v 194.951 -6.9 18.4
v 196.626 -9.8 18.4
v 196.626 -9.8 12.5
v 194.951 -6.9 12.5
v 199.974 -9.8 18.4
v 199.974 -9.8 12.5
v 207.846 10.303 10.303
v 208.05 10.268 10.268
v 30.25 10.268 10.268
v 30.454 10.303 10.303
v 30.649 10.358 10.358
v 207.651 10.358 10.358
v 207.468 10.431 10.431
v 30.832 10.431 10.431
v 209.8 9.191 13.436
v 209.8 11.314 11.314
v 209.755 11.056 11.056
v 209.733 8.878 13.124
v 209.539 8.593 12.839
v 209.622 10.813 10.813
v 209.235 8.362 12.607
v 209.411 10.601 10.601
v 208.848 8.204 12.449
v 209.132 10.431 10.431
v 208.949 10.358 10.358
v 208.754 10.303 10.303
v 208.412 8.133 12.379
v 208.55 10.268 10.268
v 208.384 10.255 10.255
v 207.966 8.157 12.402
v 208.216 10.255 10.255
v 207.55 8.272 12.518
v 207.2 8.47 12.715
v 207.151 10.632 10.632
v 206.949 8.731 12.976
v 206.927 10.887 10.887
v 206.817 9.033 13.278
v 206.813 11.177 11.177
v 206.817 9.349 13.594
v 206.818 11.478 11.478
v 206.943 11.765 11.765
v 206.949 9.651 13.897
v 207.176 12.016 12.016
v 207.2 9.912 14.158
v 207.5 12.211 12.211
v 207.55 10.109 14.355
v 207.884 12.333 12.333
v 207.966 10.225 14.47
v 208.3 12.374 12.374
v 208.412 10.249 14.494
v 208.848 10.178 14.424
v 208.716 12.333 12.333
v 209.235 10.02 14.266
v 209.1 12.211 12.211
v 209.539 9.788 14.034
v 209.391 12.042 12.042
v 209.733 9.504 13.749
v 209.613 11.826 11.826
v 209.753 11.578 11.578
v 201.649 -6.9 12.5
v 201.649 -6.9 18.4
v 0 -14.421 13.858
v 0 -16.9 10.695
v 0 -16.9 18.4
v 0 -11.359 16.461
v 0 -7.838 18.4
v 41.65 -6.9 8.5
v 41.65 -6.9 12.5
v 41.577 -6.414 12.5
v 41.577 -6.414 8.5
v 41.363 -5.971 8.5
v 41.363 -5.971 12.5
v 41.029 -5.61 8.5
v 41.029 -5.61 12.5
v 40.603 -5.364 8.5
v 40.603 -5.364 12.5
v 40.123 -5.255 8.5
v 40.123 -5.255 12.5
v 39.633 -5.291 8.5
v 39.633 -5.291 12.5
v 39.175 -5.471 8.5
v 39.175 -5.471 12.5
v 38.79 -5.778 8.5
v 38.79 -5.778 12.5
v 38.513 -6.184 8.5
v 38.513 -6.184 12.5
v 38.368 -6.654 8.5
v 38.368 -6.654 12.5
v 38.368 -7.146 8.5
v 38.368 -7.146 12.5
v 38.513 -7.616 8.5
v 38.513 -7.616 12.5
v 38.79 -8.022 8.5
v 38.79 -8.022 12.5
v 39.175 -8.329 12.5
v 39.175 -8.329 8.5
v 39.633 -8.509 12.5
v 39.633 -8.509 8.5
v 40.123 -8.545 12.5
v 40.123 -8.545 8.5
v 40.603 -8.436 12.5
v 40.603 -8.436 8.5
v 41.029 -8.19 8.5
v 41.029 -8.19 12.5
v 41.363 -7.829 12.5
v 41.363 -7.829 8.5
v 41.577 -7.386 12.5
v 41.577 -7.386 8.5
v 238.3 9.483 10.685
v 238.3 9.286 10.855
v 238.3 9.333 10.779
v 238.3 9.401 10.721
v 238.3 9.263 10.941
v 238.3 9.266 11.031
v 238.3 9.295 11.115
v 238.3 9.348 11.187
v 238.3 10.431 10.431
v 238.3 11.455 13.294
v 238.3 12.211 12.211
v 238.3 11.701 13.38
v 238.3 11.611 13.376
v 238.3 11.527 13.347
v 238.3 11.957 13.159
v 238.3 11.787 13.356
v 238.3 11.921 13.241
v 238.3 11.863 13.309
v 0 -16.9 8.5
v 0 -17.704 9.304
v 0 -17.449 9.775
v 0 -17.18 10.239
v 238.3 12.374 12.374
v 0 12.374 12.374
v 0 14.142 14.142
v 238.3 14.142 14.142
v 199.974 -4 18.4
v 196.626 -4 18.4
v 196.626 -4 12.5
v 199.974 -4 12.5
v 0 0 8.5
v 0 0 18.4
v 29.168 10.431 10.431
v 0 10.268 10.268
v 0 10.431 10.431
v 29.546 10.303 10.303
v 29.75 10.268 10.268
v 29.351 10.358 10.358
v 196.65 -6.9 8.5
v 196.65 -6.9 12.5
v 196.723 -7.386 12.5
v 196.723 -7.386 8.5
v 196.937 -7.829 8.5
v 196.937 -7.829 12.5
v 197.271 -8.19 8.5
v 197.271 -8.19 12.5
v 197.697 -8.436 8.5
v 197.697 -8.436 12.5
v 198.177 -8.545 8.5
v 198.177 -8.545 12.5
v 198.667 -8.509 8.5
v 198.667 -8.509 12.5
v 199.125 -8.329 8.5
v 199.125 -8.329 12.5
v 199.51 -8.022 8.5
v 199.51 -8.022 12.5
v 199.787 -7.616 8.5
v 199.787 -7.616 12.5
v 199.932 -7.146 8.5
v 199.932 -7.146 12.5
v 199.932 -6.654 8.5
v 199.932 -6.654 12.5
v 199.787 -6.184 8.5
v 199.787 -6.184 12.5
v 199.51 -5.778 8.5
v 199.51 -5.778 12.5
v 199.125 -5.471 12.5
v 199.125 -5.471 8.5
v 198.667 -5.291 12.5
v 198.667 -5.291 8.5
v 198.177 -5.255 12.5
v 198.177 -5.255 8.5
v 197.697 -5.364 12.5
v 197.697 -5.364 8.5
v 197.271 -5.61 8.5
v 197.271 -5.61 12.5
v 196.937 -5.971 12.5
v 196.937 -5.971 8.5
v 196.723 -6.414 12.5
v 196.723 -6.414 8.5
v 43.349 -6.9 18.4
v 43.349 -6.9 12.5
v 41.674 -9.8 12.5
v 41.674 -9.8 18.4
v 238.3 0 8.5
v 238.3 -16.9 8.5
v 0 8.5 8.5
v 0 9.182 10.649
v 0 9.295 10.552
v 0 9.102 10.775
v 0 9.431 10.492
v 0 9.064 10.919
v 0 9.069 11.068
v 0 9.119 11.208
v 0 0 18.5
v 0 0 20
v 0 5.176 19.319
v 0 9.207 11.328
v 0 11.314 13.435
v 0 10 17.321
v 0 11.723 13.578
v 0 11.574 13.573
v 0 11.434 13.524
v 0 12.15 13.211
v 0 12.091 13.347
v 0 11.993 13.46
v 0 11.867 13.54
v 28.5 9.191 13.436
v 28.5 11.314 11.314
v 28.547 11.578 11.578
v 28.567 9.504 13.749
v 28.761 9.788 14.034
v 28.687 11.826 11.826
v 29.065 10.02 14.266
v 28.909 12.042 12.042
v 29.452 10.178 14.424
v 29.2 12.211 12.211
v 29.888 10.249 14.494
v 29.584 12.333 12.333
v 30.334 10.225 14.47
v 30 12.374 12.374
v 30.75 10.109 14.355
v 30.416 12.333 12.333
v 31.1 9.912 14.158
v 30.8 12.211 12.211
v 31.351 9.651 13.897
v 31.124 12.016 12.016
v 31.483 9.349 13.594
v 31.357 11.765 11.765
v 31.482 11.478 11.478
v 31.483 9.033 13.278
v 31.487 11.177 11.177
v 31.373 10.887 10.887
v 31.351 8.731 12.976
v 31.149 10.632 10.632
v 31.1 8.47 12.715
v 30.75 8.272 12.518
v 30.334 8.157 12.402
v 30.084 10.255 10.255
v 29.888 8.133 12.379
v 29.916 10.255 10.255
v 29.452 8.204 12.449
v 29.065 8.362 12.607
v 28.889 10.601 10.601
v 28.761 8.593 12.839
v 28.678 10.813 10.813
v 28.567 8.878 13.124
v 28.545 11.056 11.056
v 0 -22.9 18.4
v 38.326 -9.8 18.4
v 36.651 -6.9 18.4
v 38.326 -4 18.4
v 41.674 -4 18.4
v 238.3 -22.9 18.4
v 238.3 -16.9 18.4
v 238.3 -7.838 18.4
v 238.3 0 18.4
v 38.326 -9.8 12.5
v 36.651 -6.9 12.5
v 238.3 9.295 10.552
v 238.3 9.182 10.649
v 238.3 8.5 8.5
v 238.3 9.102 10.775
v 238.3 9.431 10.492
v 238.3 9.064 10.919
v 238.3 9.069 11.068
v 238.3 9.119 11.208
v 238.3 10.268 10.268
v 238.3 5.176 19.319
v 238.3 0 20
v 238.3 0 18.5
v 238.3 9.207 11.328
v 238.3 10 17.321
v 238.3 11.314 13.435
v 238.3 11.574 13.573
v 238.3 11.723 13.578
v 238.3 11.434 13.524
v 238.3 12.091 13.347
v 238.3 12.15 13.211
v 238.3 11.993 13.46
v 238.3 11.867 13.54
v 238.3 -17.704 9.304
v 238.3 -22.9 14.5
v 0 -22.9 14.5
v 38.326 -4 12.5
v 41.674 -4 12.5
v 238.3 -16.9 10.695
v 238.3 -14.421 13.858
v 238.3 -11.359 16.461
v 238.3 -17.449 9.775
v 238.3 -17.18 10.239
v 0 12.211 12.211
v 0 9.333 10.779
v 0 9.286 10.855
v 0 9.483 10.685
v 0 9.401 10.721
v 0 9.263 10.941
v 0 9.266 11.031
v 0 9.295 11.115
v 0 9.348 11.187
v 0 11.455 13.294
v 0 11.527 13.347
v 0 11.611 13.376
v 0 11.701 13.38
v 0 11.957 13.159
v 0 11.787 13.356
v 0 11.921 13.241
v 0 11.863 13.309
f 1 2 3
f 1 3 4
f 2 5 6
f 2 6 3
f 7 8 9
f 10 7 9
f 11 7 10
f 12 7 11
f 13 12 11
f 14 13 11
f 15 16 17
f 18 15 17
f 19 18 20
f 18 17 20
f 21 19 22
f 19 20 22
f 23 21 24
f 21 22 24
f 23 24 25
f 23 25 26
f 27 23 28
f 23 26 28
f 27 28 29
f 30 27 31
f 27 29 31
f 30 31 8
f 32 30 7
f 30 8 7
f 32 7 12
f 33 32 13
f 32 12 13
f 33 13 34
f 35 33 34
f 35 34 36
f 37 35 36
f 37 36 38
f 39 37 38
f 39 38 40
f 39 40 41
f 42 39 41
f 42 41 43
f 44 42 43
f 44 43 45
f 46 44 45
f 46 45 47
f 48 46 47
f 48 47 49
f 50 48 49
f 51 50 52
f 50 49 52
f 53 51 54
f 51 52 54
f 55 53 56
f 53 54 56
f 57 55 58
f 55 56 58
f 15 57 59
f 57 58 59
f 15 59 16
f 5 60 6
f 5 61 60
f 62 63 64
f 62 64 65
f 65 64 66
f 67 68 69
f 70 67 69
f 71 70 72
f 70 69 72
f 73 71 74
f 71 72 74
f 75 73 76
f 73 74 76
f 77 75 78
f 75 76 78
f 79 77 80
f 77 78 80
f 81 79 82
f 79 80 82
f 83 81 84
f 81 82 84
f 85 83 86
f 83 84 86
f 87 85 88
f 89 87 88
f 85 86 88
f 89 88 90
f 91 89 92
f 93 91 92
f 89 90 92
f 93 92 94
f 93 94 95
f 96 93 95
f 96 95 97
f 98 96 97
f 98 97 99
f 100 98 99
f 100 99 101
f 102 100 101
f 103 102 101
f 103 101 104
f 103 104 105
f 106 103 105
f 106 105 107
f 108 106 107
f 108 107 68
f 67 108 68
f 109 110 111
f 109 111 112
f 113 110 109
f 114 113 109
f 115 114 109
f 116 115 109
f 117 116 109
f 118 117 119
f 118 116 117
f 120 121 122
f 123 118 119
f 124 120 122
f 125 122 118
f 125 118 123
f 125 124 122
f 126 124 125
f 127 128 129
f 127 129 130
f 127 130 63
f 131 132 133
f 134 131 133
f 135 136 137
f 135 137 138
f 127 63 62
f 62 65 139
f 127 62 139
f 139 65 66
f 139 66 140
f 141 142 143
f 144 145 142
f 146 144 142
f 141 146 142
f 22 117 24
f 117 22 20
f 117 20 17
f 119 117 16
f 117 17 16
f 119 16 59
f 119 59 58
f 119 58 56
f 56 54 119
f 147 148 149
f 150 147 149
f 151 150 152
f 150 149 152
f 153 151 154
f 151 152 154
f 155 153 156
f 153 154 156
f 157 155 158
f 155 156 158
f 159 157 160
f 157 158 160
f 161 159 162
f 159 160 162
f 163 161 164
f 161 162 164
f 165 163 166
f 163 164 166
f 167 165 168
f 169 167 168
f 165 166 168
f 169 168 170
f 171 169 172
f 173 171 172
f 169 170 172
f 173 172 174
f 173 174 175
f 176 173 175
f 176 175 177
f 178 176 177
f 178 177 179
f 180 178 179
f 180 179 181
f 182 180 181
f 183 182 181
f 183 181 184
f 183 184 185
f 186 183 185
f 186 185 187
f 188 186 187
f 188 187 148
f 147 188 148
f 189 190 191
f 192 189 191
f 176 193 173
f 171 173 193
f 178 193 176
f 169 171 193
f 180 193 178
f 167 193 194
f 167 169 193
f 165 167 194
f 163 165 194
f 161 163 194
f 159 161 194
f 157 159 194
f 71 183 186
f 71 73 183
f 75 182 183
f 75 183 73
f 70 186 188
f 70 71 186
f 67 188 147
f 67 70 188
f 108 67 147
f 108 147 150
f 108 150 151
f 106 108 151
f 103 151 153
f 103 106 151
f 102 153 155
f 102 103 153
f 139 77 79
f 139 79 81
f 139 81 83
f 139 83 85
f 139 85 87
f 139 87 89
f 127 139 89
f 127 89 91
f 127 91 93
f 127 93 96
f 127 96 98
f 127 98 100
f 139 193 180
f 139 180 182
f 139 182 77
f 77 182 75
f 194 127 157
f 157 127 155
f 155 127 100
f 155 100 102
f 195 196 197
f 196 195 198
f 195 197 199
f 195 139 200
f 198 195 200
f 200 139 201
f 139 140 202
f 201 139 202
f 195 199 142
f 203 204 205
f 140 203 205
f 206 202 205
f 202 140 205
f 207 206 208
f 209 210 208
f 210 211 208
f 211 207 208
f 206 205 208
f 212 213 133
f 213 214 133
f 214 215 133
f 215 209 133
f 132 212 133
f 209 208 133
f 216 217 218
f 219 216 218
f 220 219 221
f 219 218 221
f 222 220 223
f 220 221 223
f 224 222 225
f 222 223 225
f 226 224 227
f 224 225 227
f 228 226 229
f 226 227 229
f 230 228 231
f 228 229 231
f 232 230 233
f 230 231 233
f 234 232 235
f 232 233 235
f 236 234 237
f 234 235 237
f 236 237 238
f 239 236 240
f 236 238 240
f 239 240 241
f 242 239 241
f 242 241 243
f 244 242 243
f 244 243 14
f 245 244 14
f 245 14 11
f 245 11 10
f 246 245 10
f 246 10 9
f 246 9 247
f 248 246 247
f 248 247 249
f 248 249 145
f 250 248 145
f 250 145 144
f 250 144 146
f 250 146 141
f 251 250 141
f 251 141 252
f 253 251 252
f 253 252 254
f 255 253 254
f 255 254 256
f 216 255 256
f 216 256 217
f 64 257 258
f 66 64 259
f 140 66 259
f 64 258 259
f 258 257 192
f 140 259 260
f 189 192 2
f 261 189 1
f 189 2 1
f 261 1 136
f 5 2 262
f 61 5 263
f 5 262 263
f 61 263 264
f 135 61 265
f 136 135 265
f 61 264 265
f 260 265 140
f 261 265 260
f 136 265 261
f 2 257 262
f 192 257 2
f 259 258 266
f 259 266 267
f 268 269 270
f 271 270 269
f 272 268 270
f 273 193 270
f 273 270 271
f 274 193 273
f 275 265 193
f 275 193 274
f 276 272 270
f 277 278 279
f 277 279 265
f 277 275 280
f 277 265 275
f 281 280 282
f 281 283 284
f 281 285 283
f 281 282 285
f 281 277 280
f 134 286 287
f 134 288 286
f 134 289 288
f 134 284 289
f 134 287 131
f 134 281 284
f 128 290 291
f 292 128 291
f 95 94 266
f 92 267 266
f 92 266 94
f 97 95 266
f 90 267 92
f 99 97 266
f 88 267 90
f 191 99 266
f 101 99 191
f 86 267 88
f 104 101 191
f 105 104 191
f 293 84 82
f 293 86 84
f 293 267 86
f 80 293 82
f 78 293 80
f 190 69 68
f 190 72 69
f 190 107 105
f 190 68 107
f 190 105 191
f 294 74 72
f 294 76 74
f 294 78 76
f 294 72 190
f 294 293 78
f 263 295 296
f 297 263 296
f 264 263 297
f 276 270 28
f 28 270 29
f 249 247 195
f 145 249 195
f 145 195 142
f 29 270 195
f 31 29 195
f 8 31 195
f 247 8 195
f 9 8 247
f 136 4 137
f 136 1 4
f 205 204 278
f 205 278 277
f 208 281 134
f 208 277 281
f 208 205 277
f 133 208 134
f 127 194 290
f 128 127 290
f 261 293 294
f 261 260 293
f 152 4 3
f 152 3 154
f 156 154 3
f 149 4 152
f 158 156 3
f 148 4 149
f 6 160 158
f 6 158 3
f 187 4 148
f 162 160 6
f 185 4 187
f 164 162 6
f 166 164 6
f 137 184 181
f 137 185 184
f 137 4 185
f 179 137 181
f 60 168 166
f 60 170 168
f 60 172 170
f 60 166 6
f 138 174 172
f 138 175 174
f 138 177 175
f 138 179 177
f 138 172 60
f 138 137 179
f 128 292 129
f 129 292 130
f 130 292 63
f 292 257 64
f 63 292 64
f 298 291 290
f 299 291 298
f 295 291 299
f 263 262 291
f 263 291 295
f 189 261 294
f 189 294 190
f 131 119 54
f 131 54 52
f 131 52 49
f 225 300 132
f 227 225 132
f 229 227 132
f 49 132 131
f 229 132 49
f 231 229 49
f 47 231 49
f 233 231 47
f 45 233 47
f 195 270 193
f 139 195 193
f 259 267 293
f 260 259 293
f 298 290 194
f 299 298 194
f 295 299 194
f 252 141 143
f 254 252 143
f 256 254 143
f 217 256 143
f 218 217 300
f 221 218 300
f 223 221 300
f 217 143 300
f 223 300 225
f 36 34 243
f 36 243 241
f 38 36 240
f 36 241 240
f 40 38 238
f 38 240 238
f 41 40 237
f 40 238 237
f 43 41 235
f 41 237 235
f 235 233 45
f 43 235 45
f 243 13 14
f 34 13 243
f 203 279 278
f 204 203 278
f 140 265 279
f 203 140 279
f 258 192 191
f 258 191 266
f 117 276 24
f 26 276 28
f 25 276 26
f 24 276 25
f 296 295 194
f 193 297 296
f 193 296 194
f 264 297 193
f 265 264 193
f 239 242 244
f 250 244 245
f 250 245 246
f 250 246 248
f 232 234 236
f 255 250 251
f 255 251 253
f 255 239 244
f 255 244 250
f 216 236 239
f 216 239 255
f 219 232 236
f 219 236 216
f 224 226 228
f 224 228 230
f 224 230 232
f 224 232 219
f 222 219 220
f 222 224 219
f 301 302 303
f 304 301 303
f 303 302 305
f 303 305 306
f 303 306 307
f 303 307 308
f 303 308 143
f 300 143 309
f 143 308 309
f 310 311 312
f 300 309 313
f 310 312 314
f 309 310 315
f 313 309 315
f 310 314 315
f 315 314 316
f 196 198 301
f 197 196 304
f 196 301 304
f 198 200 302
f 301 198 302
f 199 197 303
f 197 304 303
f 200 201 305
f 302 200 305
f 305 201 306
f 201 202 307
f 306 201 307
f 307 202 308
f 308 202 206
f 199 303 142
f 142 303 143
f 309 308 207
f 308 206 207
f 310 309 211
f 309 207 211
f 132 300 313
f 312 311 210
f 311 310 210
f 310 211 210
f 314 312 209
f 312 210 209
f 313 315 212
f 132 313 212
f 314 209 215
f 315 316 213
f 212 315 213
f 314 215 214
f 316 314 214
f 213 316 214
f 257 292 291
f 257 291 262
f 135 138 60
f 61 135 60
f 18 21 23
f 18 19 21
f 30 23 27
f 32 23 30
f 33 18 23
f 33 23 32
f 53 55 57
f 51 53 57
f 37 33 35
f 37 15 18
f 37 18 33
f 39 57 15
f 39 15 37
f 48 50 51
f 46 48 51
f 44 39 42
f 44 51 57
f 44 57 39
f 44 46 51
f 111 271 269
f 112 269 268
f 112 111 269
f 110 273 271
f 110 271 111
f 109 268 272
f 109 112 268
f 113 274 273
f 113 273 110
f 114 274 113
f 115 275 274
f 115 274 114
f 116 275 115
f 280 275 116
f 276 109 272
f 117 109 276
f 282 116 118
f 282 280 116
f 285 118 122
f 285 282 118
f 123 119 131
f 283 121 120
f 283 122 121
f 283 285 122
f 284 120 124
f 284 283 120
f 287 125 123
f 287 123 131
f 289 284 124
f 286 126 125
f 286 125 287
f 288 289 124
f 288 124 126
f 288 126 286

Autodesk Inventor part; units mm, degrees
ref_plane "YZ Plane" through (0, 0, 0) normal (1, 0, 0) x (0, 1, 0)
ref_plane "XZ Plane" through (0, 0, 0) normal (0, 1, 0) x (-1, 0, 0)
ref_plane "XY Plane" through (0, 0, 0) normal (0, 0, 1) x (1, 0, 0)
sketch "Sketch1" plane through (0, 0, 0) normal (1, 0, 0) x (0, 1, 0)
  circle A0 centre (0, 0) radius 20
  line L0 (8.5, 8.5) -> (-16.9, 8.5)
  line L1 (8.5, 8.5) -> (8.5, -16.9)
  line L2 (0, 0) -> (0, 20)
  line L3 (0, 20) -> (-60.9241, 20)
  line L4 (-60.9241, 20) -> (-60.9241, 18.5)
  line L5 (-60.9241, 18.5) -> (0, 18.5)
  line L6 (0, 18.5) -> (0, 20)
  line L7 (0, 0) -> (14.1421, 14.1421)
  line L8 (0, 0) -> (20, 0)
  line L9 (-16.9, 8.5) -> (-16.9, 18.5)
  line L10 (-16.9, 8.5) -> (-22.9, 14.5)
  line L11 (-22.9, 14.5) -> (-22.9, 18.5)
  line L12 (12.3744, 12.3744) -> (12.1502, 13.2109)
  line L13 (11.3137, 13.435) -> (9.2071, 11.3284)
  line L14 (9.4313, 10.4919) -> (10.2678, 10.2678)
  line L15 (8.5, 8.5) -> (8.5, -16.9)
  line L16 (20, 0) -> (20, -60.9241)
  line L17 (20, -60.9241) -> (18.5, -60.9241)
  line L18 (18.5, -60.9241) -> (18.5, 0)
  line L19 (8.5, -16.9) -> (18.5, -16.9)
  line L20 (8.5, -16.9) -> (14.5, -22.9)
  line L21 (14.5, -22.9) -> (18.5, -22.9)
  arc A1 (9.2071, 11.3284) -> (9.4313, 10.4919) centre (9.5607, 10.9749) ccw
  arc A2 (12.1502, 13.2109) -> (11.3137, 13.435) centre (11.6673, 13.0815) ccw
  line L22 (10.4311, 10.4311) -> (9.483, 10.6851)
  arc A3 (9.3485, 11.187) -> (9.483, 10.6851) centre (9.5607, 10.9749) ccw
  line L23 (9.3485, 11.187) -> (11.4551, 13.2936)
  arc A4 (11.957, 13.1591) -> (11.4551, 13.2936) centre (11.6673, 13.0815) ccw
  line L24 (11.957, 13.1591) -> (12.2111, 12.2111)
  point P0 (0, 8.5)
  point P1 (-17.7041, 9.3041)
  point P2 (-16.9, 10.6953)
  dimension "d0" = 40
  dimension "d1" = 25.4
  dimension "d2" = 1.5
  dimension "d4" = 45
  dimension "d6" = 45
  dimension "d7" = 4
  dimension "d8" = 10
  dimension "d10" = 2.5
  dimension "d11" = 2.5
  dimension "d12" = 60
  dimension "d13" = 1.5
  dimension "d15" = 0.5
  dimension "d16" = 0.2
extrude "Extrusion1" add sketch "Sketch1" along normal blind 238.3 contours L7 L12 A2 L13 A1 L14 L0 L2 A0 | L7 L24 A4 L23 A3 L22 L14 A1 L13 A2 L12 | L5 L2 L0 L9 A0 | A0 L9 L5 | L7 L22 A3 L23 A4 L24 | L9 L10 A0 | A0 L10 L11 L5 L9
sketch "Sketch2" plane through (0, -22.9, 18.5) normal (0, 0, 1) x (1, 0, 0)
  line L0 (0, 22.9) -> (0, 0) projected
  line L1 (0, 0) -> (238.3, 0) projected
  line L2 (238.3, 22.9) -> (238.3, 0) projected
  line L3 (0, 22.9) -> (238.3, 22.9) projected
  line L4 (38.3257, 13.1) -> (36.6514, 16)
  line L5 (36.6514, 16) -> (38.3257, 18.9)
  line L6 (38.3257, 18.9) -> (41.6743, 18.9)
  line L7 (41.6743, 18.9) -> (43.3486, 16)
  line L8 (43.3486, 16) -> (41.6743, 13.1)
  line L9 (41.6743, 13.1) -> (38.3257, 13.1)
  line L10 (0, 6) -> (238.3, 6) projected
  circle A0 centre (40, 16) radius 1.65
  dimension "d20" = 10
  dimension "d21" = 5.8
  dimension "d22" = 40
  dimension "d25" = 3.3
extrude "Extrusion2" cut sketch "Sketch2" against normal blind 6 contours L4 L5 L6 L7 L8 L9 | A0
extrude "Extrusion3" cut sketch "Sketch2" against normal through all contours A0
sketch "Sketch3" plane through (0, -22.9, 18.5) normal (0, 0, 1) x (1, 0, 0)
  line L0 (0, 37.0421) -> (238.3, 37.0421) projected
  line L1 (0, 0) -> (238.3, 0) projected
  line L2 (0, 22.9) -> (0, 0) projected
  line L3 (0, 22.9) -> (0, 37.0421) projected
  line L4 (2.4384, 37.0421) -> (17.8575, 0)
  line L5 (0, 0) -> (238.3, 0) projected
  line L6 (2.4384, 37.0421) -> (0, 42.9) projected
  point P0 (0, 26.9698)
  dimension "d28" = 112.6
sketch "Sketch4" plane through (238.3, 14.1421, 14.1421) normal (0, 0.7071, -0.7071) x (-1, 0, 0)
  line L0 (238.3, 0) -> (0, 0) projected
  line L1 (0, -7.9792) -> (0, 0) projected
  line L2 (238.3, -7.9792) -> (0, -7.9792) projected
  circle A0 centre (208.3, -4) radius 1.5
  line L3 (238.3, -7.9792) -> (238.3, 0) projected
  line L4 (119.15, -7.9792) -> (119.15, 0)
  ellipse E0 centre (198.3, -18.8686) end of major axis (196.65, -18.8686) minor radius 1.1667 projected
  point P0 (238.3, -20)
  dimension "d34" = 3
  dimension "d35" = 4
  dimension "d46" = 30
extrude "Extrusion5" cut sketch "Sketch4" against normal blind 3 contours A0
ref_plane "Work Plane1" through (119.15, 0, 0) normal (-1, 0, 0) x (0, 0, 1)
mirror "Mirror1" about plane through (119.15, 0, 0) normal (-1, 0, 0) of "Extrusion5", "Extrusion2", "Extrusion3"
sketch "Sketch6" plane through (238.3, 0, 0) normal (1, 0, 0) x (0, 0, -1)
  line L0 (-14.5, -22.9) -> (-8.5, -16.9) projected
  line L1 (-8.5, -16.9) -> (-8.5, 8.5) projected
  line L2 (-8.5, 8.5) -> (-14.1421, 14.1421) projected
  arc A0 (-14.1421, 14.1421) -> (-20, 0) centre (0, 0) ccw projected
  line L3 (-20, 0) -> (-18.5, 0) projected
  line L4 (-18.5, 0) -> (-18.5, -22.9) projected
  line L5 (-18.5, -22.9) -> (-14.5, -22.9) projected
  line L6 (-18.5, -22.9) -> (-18.4, -22.9)
  line L7 (-18.4, -22.9) -> (-18.4, 0)
  line L8 (-18.4, 0) -> (-18.5, 0)
  line L9 (-18.5, 0) -> (-18.5, -22.9)
  dimension "d50" = 0.1
extrude "Extrusion7" cut sketch "Sketch6" against normal through all contours L5 L4 L8 L7
properties part number "ESQUINA_REDONDEADA_R20" material "Steel, Mild, Welded"
